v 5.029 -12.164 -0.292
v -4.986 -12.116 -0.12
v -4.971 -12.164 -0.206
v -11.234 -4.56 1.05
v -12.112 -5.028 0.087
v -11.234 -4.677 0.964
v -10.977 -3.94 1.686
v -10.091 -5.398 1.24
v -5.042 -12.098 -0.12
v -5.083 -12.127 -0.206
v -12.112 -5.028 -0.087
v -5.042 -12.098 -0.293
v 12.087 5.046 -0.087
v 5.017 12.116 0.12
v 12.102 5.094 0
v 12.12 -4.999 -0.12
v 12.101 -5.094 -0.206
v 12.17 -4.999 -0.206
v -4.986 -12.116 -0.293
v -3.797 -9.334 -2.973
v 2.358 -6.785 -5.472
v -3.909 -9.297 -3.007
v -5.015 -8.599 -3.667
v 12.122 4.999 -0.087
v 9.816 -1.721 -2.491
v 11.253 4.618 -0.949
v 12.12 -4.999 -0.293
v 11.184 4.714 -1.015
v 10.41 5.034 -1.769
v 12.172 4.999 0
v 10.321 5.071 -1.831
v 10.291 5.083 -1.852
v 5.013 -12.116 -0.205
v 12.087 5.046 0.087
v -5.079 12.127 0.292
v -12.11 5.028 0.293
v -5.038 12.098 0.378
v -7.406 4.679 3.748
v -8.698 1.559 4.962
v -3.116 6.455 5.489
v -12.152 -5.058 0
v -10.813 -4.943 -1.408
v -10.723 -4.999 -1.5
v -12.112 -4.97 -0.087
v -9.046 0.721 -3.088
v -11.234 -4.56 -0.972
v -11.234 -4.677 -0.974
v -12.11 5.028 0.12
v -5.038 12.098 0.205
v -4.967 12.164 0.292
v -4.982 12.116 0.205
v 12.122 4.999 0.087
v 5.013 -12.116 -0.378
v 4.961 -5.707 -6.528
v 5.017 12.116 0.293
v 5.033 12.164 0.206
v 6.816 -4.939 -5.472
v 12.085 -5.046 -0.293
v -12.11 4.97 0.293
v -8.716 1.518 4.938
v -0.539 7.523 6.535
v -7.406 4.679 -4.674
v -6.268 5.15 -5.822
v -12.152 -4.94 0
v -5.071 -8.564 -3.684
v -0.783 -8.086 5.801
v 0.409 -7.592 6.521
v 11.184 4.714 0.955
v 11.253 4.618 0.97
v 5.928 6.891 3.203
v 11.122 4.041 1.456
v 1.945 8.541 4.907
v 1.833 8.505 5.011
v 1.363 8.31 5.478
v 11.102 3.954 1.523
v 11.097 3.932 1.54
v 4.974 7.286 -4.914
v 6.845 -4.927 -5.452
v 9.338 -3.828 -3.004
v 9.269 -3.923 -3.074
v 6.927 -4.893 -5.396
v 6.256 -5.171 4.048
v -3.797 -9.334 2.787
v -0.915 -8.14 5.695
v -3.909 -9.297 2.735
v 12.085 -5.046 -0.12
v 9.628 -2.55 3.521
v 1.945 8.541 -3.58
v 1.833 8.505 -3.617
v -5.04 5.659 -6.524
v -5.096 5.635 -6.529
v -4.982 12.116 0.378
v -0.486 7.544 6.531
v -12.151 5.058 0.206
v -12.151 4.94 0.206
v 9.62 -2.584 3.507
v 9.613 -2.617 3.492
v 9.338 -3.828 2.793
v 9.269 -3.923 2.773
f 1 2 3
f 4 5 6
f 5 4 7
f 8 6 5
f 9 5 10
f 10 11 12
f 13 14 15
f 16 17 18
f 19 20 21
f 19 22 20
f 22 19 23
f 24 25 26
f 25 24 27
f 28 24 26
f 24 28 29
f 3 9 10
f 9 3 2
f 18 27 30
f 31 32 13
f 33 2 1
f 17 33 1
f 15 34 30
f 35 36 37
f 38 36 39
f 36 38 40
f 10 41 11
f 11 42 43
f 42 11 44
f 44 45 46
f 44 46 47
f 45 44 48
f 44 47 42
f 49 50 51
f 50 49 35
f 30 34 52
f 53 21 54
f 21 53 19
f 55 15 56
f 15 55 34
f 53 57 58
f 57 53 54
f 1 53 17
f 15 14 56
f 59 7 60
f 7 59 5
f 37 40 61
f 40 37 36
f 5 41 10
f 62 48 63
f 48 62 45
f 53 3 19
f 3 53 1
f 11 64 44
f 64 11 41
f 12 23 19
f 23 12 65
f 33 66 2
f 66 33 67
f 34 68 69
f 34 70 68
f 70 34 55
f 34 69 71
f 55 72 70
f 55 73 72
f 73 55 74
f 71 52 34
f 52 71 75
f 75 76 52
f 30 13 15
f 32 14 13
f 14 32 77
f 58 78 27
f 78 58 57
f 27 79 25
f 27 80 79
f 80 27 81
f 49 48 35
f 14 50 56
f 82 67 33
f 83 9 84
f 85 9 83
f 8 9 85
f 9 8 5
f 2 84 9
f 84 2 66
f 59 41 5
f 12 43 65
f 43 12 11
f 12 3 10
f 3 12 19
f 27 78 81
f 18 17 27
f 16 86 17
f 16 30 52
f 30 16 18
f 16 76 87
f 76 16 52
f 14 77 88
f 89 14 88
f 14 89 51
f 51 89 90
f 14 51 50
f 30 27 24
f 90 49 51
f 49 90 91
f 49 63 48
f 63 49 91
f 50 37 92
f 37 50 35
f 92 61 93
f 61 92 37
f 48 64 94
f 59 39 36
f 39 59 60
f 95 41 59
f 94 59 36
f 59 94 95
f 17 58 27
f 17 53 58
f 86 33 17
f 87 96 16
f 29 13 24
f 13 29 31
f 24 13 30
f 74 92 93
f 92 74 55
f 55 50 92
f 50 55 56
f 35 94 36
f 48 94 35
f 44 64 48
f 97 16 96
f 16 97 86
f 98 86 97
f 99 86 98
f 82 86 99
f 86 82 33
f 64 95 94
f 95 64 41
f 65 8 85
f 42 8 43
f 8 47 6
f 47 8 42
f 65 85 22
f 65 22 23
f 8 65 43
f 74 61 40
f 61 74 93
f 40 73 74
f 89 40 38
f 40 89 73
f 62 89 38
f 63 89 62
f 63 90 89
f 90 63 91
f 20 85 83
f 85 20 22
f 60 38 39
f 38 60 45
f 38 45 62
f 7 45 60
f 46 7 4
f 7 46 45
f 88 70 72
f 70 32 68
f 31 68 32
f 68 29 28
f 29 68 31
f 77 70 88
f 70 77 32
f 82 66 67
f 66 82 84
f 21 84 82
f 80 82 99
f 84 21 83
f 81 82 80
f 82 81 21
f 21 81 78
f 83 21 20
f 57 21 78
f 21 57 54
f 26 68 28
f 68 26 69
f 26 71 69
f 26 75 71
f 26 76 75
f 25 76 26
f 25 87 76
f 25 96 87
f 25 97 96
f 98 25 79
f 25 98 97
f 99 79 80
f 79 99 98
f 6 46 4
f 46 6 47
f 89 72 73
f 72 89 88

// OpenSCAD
// Auto-generated OpenSCAD file

    inner_points = 10*[[0.4619566327305774, 0.19130099183283442, -1.2071067811865475], [-0.46195663273057797, -0.19130099183283406, -1.2071067811865475], [0.46195663273057797, 0.19130099183283406, 1.2071067811865475], [-0.4619566327305774, -0.19130099183283442, 1.2071067811865475], [1.1152619679663673, 0.46184144897825313, -0.5000000000000002], [-1.1152619679663673, -0.461841448978253, -0.4999999999999998], [1.1152619679663673, 0.461841448978253, 0.4999999999999998], [-1.1152619679663673, -0.46184144897825313, 0.5000000000000002], [0.27054045714541874, -0.6533053352357897, -0.7071067811865477], [0.2705404571454191, -0.6533053352357899, 0.7071067811865475], [0.9238457923812087, -0.38276487809037096, -2.792716462039856e-16], [-0.38276487809037096, -0.9238457923812087, -4.7467621895578584e-17], [0.19141617558515864, 0.8446063270686242, -0.49999999999999994], [-0.7324970898759966, 0.46200434340295565, -0.4999999999999998], [0.19141617558515892, 0.844606327068624, 0.5000000000000001], [-0.7324970898759964, 0.4620043434029555, 0.5000000000000002]];

    outer_points = 10*[[-1.20715085540928, -0.49989358214569235, 8.597197695362629e-07], [-1.2069745470430784, 0.49989358214569235, 0.020630814483457764], [1.2069745470430784, -0.49989358214569235, -0.020630814483457764], [1.20715085540928, 0.49989358214569235, -8.597197695362629e-07], [-0.5001945645070083, -1.2068498657593993, -0.020629598656099847], [-0.49976891845816496, 1.2068498657593993, 0.029175517925539712], [0.49976891845816496, -1.2068498657593993, -0.029175517925539712], [0.5001945645070083, 1.2068498657593993, 0.020629598656099847], [-0.7010393684168068, -0.014588113623628919, 0.7129733451333711], [0.7131225510703787, -0.014588113623628919, 0.7008875901995837], [0.005916922485465028, -0.721544397237336, 0.6923428867575018], [0.006166260168106925, 0.6923681699900782, 0.721518048575453], [-0.5061114869924733, -0.4853054685220634, -0.7129724854136016], [-0.5059351786262719, 0.5144816957693212, -0.6923425306499132], [0.4938519959726999, -0.4853054685220634, -0.7215184046830415], [0.4940283043389013, 0.5144816957693212, -0.7008884499193532]];

    // Convex hull for inner set (I)
    module inner_hull() {
        hull() {
            for (p = inner_points) {
                translate(p) sphere(r=0.1);
            }
        }
    }

    // Convex hull for outer set (O) minus inner hull (O \ I)
    module outer_minus_inner() {
        difference() {
            hull() {
                for (p = outer_points) {
                    translate(p) sphere(r=0.1);
                }
            }
            inner_hull(); // Subtract inner hull
        }
    }

    // Convex hull for outer set (O) minus all translated inner hulls
    module outer_minus_AllTranslationInner() {
        difference() {
            hull() {
                for (p = outer_points) {
                    translate(p) sphere(r=0.1);
                }
            }
            hull() {
                translate([0,0,50]) inner_hull();
                translate([0,0,-50]) inner_hull();
            }; // Subtract translated inner hulls
        }
    }

    // Difference between outer_minus_inner and outer_minus_AllTranslationInner
    module outer_minus_inner_diff() {
        difference() {
            // Outer minus inner
            difference() {
                hull() {
                    for (p = outer_points) {
                        translate(p) sphere(r=0.1);
                    }
                }
                inner_hull();
            }

            // Subtract Outer minus AllTranslationInner
            difference() {
                hull() {
                    for (p = outer_points) {
                        translate(p) sphere(r=0.1);
                    }
                }
                hull() {
                    translate([0,0,50]) inner_hull();
                    translate([0,0,-50]) inner_hull();
                };
            }
        }
    }

    // Rendering all with colors applied
    color([0, 1, 0, 1]) outer_minus_AllTranslationInner(); // Opaque green
    
